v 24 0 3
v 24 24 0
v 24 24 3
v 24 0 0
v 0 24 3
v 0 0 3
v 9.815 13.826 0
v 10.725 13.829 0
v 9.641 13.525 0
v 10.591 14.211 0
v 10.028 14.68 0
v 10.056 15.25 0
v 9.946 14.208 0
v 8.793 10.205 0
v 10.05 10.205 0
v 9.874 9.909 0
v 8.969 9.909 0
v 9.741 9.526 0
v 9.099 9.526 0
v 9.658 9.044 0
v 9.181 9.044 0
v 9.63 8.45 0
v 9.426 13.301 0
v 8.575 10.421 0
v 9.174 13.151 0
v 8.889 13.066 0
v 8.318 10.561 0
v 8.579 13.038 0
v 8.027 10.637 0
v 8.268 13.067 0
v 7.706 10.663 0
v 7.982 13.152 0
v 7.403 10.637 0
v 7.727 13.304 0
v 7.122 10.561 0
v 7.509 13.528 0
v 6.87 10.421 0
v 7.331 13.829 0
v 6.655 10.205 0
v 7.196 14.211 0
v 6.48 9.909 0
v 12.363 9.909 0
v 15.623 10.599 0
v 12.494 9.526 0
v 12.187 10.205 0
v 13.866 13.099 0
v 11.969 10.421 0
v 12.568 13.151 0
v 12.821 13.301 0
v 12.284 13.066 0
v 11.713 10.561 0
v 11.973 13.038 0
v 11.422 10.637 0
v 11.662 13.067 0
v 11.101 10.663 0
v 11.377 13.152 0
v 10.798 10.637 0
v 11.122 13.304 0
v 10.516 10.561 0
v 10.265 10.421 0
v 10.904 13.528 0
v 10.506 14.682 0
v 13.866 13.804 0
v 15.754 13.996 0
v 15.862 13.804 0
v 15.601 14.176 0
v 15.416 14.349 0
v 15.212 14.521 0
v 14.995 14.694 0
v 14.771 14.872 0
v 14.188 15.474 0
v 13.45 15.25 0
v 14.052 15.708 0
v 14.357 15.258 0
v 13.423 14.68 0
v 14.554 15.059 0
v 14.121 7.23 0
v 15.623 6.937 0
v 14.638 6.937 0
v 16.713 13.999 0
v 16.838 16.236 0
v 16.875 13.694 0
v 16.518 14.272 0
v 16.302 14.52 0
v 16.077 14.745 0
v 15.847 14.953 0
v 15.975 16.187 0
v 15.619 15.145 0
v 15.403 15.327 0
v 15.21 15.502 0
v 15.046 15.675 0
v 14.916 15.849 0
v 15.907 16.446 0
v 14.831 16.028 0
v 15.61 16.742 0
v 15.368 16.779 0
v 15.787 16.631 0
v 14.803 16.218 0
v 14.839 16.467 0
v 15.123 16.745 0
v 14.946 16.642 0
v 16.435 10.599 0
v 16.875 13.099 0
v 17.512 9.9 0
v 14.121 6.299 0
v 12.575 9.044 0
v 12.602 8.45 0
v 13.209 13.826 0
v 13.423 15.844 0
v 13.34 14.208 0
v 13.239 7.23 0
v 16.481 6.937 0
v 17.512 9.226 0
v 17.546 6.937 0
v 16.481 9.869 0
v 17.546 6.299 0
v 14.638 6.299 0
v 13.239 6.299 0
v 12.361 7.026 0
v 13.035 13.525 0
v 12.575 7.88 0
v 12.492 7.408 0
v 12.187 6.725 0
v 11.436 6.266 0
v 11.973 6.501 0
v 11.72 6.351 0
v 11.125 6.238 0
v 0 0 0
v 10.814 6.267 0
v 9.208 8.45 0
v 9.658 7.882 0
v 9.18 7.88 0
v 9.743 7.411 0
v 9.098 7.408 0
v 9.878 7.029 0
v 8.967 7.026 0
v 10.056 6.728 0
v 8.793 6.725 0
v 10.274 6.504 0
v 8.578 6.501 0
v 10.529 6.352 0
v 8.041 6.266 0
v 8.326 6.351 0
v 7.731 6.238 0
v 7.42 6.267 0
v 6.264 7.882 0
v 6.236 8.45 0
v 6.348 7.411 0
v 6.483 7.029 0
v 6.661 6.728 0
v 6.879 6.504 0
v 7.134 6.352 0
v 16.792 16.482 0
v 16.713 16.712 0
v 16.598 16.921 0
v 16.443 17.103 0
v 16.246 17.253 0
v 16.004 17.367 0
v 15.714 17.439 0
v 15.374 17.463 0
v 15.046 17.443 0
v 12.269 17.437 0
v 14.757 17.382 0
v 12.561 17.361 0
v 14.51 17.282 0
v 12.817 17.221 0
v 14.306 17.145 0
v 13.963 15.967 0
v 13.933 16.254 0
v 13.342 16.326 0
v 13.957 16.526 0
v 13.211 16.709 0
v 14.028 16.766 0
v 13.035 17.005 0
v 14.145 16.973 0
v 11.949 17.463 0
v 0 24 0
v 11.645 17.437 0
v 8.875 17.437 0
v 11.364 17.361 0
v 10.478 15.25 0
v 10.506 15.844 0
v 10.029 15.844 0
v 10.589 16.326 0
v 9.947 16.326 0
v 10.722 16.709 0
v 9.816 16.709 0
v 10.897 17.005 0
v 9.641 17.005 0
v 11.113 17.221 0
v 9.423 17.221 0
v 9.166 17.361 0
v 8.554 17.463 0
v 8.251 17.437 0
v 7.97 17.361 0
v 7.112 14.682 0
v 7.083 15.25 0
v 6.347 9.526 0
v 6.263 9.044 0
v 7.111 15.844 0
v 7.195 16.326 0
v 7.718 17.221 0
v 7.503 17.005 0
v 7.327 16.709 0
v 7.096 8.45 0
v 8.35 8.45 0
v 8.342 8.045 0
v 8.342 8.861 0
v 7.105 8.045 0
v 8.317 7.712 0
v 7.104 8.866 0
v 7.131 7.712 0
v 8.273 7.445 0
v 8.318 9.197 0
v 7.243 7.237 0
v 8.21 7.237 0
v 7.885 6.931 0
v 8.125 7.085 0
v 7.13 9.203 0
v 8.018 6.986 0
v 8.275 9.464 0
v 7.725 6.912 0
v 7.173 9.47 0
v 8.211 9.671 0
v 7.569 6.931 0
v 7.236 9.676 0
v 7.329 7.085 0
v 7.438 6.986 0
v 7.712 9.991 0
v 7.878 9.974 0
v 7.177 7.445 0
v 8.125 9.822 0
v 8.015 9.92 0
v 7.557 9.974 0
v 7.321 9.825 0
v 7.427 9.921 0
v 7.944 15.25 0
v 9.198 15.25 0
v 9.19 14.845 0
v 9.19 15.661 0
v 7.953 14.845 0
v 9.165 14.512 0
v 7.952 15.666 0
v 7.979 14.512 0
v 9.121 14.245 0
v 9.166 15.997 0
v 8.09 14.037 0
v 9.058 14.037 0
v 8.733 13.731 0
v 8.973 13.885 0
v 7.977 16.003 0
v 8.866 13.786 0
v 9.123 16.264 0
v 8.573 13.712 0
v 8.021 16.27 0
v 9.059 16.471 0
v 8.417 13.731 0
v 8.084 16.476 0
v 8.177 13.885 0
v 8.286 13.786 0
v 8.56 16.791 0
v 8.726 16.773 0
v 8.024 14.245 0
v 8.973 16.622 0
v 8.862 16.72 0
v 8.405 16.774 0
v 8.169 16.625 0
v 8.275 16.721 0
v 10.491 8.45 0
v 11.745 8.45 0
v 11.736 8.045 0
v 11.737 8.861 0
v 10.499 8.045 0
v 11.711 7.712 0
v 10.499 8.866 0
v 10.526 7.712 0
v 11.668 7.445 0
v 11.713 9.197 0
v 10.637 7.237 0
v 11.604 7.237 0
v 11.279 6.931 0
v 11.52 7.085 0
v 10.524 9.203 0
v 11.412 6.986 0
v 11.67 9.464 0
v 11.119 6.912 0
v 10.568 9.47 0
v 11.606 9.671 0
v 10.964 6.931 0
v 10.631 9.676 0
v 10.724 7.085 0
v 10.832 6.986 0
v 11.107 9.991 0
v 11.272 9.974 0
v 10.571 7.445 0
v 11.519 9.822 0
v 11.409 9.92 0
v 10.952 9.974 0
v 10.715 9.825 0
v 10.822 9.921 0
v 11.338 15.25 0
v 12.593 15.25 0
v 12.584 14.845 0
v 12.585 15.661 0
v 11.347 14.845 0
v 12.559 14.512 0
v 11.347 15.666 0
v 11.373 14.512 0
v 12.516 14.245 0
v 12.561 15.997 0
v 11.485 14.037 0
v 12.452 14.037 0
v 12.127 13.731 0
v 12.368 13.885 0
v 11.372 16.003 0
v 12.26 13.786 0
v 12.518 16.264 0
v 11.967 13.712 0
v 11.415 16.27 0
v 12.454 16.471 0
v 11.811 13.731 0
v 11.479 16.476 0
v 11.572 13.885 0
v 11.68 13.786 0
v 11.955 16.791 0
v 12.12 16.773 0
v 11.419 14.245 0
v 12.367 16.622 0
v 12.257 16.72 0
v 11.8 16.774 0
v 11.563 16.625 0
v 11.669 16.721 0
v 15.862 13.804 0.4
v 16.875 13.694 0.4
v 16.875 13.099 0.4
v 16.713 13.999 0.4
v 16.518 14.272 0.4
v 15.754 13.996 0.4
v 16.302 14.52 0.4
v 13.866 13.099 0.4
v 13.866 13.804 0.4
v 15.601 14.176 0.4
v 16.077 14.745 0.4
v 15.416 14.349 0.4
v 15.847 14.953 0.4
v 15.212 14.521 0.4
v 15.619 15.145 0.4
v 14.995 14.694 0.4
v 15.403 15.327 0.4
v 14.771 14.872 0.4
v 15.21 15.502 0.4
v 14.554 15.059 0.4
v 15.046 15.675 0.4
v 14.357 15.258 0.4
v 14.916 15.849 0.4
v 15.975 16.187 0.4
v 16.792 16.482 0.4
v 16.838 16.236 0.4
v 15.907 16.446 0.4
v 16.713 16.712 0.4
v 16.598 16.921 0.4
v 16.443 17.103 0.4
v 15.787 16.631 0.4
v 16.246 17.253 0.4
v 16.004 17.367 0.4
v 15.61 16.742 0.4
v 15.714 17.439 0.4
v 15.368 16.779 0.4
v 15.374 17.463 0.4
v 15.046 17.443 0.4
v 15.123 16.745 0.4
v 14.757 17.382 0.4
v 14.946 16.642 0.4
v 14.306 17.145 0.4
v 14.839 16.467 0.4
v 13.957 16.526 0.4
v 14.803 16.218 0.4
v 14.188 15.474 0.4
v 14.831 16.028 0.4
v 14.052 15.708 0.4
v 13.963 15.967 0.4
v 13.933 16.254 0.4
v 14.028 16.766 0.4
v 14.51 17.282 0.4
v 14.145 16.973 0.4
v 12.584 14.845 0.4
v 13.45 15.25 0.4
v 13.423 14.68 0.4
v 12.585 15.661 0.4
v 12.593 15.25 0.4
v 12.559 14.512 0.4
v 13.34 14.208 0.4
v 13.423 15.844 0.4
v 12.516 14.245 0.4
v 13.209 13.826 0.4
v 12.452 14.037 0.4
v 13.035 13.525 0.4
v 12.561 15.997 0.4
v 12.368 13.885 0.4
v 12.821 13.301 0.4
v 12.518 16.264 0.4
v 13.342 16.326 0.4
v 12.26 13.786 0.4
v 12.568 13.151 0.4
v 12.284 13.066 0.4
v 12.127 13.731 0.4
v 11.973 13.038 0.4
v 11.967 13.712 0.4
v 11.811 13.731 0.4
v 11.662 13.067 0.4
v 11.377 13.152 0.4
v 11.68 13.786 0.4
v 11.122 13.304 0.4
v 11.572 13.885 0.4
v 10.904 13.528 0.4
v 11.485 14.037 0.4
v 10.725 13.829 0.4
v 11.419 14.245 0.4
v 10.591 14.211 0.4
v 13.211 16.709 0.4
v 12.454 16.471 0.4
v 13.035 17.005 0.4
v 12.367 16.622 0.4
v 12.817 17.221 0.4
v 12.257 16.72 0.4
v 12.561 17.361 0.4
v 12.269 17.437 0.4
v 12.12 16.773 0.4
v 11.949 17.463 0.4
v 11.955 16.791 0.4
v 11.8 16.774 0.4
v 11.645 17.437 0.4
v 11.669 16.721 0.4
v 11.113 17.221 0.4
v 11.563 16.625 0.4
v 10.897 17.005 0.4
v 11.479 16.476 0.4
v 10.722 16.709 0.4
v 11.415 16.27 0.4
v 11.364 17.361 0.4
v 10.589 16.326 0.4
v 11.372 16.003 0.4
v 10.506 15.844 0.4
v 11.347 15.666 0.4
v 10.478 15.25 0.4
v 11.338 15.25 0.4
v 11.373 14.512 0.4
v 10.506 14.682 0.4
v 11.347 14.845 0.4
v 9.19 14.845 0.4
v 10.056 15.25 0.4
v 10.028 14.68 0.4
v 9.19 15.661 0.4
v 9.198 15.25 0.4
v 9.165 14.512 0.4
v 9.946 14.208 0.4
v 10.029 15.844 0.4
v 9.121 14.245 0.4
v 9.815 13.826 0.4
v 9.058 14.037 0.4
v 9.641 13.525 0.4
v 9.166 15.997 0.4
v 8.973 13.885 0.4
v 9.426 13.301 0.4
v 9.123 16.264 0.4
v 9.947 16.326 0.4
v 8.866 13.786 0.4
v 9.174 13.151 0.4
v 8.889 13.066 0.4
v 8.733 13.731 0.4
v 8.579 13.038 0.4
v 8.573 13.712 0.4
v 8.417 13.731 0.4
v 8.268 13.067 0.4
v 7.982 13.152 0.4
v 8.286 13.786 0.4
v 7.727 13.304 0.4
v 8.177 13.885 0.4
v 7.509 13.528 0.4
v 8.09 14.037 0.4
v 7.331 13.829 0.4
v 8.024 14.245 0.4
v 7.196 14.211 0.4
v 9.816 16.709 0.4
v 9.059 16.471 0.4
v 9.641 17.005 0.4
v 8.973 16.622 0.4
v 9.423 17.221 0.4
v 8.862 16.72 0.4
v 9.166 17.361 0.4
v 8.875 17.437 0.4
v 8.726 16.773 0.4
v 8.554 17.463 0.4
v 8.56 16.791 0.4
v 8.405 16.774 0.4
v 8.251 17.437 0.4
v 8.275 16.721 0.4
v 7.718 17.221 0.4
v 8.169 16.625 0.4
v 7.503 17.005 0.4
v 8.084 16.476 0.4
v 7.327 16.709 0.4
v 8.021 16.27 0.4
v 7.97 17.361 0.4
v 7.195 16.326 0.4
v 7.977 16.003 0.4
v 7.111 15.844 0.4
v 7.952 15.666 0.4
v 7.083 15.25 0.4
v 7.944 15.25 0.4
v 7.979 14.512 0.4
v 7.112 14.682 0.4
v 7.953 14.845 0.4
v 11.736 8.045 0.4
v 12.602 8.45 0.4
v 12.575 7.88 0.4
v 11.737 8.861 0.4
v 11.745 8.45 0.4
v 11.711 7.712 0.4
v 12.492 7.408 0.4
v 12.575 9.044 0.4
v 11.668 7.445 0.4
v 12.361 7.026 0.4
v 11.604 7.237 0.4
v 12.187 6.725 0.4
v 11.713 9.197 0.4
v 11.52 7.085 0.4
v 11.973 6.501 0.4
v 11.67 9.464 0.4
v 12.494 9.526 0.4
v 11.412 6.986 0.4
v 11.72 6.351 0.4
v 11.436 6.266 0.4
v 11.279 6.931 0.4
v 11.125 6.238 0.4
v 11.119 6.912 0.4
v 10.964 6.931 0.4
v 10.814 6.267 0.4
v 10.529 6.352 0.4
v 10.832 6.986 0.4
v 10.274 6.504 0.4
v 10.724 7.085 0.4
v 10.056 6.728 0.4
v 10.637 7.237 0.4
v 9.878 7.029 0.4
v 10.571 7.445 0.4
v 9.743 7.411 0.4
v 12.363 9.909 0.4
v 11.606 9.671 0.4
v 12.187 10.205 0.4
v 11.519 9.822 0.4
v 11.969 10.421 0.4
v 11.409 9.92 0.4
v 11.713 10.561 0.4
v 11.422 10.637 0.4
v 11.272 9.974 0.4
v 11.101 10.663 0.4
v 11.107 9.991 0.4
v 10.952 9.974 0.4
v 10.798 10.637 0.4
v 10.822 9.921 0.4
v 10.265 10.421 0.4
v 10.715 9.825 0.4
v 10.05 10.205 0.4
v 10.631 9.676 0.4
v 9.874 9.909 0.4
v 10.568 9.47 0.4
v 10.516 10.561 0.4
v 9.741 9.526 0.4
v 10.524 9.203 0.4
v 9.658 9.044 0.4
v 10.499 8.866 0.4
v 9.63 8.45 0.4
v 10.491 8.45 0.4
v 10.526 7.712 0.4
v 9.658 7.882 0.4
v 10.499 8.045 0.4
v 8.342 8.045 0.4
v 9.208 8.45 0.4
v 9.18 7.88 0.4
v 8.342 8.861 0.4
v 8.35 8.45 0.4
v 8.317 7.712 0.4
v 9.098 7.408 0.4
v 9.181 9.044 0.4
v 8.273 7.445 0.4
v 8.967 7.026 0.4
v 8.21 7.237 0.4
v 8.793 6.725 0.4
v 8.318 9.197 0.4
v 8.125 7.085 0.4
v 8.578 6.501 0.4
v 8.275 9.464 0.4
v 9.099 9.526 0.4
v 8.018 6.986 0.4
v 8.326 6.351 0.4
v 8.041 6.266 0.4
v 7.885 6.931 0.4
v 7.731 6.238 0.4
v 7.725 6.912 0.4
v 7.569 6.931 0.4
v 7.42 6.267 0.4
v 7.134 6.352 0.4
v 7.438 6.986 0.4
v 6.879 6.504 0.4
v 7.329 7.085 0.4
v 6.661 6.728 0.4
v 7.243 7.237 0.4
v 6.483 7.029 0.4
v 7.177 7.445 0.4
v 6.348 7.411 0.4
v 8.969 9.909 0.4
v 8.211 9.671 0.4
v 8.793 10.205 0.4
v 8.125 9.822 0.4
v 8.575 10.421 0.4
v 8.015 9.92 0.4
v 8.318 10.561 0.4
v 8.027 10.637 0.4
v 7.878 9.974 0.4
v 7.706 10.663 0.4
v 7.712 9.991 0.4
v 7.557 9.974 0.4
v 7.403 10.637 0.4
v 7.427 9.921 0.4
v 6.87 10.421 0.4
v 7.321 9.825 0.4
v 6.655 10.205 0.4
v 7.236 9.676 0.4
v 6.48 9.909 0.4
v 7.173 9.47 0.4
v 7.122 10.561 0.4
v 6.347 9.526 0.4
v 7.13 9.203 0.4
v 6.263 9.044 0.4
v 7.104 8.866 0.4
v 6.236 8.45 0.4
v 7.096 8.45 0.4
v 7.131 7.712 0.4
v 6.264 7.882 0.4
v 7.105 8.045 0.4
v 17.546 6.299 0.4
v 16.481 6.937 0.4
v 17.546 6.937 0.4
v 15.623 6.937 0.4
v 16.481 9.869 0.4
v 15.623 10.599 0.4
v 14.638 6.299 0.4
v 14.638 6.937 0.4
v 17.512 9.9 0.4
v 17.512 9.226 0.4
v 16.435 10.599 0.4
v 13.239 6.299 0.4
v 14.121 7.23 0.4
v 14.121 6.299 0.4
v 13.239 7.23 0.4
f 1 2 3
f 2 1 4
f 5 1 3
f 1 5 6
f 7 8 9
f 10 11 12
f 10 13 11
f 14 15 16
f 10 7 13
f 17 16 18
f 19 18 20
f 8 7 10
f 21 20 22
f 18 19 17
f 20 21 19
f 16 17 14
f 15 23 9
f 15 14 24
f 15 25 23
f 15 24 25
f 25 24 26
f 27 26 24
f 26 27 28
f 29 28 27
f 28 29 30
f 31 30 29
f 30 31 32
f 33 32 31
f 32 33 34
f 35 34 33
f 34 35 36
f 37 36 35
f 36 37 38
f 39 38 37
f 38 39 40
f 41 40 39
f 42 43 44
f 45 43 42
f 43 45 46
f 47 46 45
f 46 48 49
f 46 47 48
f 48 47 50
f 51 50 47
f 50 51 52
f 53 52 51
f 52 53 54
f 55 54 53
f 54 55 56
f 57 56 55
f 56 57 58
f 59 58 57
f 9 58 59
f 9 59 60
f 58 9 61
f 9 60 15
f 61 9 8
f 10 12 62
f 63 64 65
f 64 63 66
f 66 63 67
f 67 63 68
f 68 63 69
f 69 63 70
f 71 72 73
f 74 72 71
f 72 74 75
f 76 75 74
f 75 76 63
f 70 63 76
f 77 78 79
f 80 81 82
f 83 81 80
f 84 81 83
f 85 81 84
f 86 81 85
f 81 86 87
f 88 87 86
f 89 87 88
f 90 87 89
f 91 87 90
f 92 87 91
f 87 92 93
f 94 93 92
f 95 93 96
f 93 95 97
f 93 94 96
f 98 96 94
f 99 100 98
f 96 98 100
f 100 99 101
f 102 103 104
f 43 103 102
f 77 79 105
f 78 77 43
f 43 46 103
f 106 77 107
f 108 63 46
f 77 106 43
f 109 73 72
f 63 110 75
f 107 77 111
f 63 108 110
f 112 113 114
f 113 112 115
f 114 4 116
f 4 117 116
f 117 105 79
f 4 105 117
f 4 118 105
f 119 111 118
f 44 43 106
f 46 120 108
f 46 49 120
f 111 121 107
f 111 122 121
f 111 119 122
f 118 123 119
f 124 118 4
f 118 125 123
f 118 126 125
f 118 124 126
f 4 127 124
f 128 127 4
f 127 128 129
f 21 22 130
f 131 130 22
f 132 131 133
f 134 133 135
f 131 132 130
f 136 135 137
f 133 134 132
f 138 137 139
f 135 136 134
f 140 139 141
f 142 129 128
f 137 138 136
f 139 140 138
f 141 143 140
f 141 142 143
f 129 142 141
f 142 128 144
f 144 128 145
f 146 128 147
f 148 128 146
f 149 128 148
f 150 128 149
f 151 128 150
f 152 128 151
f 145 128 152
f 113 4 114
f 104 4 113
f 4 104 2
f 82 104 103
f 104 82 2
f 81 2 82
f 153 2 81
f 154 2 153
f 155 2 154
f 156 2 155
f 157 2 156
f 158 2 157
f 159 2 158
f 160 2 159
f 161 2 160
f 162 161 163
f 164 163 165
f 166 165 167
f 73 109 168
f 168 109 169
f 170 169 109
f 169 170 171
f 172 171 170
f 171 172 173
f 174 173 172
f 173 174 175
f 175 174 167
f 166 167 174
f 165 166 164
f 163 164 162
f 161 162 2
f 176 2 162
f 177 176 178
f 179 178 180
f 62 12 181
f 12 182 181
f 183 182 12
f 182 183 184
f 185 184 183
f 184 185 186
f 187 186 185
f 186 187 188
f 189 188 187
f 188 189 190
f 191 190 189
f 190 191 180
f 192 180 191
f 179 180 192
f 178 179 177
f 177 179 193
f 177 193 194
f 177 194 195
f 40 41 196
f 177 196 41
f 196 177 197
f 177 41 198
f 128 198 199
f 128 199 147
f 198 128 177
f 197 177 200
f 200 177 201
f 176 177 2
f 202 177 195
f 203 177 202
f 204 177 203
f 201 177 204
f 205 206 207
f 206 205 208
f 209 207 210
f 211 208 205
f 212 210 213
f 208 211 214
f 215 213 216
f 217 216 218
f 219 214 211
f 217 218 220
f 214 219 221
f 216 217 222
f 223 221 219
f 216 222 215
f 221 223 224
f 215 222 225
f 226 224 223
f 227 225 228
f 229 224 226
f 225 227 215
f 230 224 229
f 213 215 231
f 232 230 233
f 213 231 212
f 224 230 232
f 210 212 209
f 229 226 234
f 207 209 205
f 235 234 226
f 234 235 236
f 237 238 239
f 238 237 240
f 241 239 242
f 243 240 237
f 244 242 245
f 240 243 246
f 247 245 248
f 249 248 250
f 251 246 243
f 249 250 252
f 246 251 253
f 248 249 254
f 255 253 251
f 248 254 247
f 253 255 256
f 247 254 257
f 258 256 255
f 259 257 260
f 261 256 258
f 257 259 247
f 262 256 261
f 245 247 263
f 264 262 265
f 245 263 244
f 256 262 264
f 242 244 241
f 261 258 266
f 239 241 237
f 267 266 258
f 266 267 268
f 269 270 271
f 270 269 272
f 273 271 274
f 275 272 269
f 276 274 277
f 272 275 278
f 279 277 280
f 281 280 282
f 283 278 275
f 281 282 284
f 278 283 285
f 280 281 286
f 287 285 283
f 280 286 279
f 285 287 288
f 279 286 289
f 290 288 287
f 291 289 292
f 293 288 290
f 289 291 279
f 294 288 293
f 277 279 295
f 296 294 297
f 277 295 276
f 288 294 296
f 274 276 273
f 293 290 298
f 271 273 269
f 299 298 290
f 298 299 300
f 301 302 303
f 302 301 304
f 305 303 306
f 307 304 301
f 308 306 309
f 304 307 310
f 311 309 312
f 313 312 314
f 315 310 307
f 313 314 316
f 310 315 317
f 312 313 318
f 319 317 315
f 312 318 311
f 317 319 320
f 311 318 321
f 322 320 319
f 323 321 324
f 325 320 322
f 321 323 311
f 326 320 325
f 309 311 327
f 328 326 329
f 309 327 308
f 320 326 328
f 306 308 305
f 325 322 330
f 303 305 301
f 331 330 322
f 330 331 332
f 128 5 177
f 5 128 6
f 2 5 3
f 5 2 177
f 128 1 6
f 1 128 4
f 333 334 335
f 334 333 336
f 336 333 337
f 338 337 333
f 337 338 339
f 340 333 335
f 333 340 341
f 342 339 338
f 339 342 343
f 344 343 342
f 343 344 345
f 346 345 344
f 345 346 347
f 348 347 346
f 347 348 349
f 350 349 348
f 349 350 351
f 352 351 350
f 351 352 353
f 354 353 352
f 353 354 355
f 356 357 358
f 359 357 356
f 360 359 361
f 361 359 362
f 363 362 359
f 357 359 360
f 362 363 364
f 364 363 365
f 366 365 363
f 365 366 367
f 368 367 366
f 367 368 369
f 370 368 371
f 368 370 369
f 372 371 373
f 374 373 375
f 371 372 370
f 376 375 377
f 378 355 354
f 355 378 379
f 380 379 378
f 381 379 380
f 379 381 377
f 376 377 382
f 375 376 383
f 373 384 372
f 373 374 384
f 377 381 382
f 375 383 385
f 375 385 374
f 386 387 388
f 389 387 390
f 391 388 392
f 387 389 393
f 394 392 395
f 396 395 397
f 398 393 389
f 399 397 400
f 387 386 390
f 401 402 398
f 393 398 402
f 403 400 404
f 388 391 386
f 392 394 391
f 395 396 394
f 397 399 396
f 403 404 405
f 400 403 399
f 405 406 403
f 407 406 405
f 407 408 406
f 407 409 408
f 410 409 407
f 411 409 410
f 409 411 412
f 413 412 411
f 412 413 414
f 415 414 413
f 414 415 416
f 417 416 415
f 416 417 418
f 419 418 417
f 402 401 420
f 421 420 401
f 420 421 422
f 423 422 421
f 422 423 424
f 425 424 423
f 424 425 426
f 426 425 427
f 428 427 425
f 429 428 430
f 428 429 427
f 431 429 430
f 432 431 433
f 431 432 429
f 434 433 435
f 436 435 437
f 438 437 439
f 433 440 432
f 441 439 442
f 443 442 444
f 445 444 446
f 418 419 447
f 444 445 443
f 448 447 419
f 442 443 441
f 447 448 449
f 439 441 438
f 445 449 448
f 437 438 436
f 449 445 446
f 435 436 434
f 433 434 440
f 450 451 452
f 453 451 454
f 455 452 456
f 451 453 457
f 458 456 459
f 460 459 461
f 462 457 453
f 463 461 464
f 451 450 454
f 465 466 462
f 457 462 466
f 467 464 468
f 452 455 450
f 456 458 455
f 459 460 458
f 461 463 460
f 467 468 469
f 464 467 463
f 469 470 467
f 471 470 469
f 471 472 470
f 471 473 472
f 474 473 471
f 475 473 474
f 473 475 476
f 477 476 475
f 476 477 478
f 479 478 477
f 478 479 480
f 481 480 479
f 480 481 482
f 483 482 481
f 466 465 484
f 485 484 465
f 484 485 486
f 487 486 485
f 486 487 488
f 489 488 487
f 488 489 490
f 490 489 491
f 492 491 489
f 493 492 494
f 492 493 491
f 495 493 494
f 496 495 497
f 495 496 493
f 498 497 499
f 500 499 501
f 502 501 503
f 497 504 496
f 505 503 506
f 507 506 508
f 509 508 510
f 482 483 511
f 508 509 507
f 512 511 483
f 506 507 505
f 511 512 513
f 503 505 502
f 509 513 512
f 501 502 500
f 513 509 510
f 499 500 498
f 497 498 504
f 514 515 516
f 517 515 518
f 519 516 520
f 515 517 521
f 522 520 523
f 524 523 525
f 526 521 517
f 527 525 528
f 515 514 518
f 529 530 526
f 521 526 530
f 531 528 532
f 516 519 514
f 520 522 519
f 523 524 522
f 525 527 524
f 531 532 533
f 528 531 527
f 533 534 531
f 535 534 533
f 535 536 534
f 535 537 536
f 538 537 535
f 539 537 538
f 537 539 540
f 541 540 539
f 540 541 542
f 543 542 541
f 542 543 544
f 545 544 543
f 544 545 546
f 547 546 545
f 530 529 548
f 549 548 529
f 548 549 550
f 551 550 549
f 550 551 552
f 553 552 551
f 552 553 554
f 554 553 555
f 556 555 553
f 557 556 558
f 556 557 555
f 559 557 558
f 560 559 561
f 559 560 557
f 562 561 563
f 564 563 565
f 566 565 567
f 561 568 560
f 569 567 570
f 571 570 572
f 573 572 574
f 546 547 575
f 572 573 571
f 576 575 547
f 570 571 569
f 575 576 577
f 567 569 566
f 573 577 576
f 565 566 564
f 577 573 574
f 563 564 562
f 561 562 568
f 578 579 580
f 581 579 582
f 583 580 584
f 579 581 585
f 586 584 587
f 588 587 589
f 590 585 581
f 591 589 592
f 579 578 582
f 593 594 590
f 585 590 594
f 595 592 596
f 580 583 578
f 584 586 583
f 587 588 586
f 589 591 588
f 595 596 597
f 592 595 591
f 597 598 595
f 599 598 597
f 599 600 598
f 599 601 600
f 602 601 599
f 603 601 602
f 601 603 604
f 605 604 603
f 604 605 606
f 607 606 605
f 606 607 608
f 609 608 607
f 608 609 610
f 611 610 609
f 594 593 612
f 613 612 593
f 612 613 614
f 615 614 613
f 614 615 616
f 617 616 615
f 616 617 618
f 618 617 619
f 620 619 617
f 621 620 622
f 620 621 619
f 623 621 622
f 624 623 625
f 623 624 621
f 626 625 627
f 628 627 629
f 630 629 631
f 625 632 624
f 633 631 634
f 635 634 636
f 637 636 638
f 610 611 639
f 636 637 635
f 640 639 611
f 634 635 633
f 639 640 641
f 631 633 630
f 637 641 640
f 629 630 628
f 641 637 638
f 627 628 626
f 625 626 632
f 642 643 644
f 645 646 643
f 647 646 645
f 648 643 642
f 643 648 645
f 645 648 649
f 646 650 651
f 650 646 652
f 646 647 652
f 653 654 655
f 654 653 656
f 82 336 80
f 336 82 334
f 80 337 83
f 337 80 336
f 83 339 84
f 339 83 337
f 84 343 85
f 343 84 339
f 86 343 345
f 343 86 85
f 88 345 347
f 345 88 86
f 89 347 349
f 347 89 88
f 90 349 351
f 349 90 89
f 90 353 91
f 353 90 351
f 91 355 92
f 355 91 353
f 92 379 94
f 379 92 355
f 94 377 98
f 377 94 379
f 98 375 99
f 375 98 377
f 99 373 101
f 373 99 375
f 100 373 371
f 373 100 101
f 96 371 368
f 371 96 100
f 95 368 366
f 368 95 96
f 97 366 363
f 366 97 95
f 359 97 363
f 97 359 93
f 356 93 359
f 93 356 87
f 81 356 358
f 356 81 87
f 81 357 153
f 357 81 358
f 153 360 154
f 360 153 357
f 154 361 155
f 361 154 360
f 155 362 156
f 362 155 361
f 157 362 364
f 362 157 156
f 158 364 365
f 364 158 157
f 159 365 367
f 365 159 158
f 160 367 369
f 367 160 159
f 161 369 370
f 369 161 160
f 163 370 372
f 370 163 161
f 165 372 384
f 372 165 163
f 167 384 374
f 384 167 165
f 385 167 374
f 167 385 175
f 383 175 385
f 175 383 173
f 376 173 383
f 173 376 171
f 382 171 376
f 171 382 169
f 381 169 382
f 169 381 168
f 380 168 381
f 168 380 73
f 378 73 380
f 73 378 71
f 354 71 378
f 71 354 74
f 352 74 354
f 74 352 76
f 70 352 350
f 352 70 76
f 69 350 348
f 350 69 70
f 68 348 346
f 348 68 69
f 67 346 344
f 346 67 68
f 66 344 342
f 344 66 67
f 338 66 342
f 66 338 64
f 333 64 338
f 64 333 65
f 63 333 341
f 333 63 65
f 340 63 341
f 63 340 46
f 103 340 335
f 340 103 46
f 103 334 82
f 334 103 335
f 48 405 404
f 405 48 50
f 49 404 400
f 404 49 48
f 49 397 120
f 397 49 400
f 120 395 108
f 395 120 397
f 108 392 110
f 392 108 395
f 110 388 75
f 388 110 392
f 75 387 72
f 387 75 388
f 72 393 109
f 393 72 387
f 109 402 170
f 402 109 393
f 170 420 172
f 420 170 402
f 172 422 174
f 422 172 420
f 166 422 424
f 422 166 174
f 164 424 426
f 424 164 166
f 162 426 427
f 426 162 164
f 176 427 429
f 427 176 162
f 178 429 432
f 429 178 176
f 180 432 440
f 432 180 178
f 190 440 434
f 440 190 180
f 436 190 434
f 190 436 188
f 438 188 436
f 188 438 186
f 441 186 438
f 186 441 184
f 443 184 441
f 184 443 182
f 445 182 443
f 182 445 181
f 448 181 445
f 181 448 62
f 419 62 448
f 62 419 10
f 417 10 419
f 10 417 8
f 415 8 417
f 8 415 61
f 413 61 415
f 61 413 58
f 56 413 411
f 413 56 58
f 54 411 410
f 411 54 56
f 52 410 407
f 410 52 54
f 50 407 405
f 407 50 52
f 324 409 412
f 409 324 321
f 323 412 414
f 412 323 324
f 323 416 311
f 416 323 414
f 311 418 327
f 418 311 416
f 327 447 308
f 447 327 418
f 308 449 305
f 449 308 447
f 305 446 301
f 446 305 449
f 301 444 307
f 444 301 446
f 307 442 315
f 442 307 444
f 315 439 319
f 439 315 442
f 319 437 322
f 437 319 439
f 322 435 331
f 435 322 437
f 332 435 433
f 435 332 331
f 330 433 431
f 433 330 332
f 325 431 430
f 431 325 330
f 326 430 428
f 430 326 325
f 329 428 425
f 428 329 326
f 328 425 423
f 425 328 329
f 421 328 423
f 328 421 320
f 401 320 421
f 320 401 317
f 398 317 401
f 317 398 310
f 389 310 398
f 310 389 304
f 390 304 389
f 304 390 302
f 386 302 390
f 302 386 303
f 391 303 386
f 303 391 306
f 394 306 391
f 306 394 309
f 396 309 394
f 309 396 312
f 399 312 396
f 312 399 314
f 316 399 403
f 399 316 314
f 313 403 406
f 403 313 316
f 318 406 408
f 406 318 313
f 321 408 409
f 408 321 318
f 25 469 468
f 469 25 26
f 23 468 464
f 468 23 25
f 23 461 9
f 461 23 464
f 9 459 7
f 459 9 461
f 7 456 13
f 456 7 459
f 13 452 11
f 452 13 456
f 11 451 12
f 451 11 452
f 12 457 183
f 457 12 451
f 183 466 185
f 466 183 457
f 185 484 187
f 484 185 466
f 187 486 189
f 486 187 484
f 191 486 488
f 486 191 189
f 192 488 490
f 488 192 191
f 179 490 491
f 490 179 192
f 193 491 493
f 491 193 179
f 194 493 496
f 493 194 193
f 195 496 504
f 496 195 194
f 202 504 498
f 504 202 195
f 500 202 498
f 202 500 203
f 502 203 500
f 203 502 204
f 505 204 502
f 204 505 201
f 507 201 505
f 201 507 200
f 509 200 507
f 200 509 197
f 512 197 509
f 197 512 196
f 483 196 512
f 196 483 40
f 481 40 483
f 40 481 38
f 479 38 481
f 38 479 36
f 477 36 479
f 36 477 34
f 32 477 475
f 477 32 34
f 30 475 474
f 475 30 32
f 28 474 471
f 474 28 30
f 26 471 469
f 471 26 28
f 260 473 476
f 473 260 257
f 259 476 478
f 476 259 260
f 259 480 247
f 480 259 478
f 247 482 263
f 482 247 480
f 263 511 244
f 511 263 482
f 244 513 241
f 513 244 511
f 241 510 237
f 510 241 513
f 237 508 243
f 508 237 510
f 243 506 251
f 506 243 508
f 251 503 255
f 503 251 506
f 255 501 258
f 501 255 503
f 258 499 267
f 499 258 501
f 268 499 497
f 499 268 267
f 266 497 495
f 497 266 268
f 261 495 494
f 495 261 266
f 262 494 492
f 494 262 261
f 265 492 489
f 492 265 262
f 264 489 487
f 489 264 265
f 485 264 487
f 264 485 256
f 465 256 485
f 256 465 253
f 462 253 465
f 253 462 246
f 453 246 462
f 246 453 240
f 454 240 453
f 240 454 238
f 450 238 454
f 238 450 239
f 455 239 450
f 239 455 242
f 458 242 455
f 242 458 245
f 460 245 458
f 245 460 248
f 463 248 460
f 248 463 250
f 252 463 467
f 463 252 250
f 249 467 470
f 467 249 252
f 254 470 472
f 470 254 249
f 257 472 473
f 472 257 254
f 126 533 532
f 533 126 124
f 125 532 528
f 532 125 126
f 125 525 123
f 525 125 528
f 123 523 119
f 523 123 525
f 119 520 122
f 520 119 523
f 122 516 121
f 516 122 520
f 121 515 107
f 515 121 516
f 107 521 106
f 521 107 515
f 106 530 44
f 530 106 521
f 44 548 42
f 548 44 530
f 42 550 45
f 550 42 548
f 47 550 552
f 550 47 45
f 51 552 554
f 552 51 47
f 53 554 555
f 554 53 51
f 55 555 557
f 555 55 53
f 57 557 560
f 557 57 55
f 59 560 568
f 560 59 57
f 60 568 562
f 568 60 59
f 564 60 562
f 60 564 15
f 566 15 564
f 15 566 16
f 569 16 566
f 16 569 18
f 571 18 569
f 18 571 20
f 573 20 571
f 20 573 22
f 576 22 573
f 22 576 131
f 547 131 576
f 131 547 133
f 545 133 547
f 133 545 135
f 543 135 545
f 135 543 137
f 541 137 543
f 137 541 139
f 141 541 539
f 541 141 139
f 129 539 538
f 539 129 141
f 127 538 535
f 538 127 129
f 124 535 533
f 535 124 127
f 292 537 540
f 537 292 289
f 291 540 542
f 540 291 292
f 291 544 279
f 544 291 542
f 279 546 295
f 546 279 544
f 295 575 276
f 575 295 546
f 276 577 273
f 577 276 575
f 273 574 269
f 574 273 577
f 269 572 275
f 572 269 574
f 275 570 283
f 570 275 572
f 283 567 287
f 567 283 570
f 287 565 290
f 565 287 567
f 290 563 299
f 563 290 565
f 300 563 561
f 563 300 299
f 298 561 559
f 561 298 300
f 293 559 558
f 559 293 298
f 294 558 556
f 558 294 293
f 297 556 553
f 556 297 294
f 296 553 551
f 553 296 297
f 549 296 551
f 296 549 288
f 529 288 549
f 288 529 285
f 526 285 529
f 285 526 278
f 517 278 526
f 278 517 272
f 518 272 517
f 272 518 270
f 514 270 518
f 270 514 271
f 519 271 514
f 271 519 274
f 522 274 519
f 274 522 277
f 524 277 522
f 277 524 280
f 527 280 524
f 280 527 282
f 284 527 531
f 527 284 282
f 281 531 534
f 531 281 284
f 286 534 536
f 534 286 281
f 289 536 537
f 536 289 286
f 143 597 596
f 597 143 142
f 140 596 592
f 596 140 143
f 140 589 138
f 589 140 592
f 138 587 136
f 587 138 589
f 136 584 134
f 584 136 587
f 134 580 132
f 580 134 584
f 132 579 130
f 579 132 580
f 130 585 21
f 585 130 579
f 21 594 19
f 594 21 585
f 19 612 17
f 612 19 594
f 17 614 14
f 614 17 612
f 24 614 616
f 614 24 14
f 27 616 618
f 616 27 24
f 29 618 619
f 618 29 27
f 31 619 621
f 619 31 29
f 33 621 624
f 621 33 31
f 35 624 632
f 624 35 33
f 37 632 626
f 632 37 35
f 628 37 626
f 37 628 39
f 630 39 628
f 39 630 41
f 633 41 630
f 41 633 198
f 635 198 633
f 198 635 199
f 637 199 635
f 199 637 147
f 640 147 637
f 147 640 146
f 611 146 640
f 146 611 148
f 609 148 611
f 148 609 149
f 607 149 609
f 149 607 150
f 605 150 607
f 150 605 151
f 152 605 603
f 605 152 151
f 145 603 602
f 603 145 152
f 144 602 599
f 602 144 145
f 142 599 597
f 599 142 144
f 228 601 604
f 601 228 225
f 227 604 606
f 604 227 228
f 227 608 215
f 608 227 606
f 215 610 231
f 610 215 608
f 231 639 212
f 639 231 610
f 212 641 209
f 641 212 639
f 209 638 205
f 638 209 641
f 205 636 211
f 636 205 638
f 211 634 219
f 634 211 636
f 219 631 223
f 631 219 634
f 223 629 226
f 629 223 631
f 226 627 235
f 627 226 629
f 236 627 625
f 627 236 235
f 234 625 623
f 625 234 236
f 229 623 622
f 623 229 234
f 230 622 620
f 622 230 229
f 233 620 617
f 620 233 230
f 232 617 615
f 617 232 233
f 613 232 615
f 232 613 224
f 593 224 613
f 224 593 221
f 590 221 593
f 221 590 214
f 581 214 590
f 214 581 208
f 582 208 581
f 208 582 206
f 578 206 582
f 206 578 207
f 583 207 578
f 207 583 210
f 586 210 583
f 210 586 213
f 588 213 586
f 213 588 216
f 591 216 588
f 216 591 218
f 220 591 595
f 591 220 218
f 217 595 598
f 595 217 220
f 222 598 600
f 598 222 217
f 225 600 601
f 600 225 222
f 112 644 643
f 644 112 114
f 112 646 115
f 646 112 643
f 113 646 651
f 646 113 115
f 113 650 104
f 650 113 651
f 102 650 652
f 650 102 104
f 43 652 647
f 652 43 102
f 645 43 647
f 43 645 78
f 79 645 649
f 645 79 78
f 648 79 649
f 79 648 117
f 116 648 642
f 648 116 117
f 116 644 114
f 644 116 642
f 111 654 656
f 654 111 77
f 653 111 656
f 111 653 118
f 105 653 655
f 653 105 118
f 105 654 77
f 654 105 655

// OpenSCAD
// Top surface specimen: a 24 x 24 x 3 mm square; the label is engraved 0.4 mm into the bottom, mirrored, so the top
// stays clean and the label reads right when the square is flipped over.
line1 = "200";
line2 = "1.00";

size = 24;
h = 3;

difference() {
    cube([size, size, h]);
    translate([size / 2, size / 2, -1]) linear_extrude(1.4) mirror([1, 0, 0]) {
        translate([0, 3.2]) text(line1, size = 4.5, font = "Liberation Sans:style=Bold", halign = "center", valign = "center");
        translate([0, -3.6]) text(line2, size = 4.5, font = "Liberation Sans:style=Bold", halign = "center", valign = "center");
    }
}
